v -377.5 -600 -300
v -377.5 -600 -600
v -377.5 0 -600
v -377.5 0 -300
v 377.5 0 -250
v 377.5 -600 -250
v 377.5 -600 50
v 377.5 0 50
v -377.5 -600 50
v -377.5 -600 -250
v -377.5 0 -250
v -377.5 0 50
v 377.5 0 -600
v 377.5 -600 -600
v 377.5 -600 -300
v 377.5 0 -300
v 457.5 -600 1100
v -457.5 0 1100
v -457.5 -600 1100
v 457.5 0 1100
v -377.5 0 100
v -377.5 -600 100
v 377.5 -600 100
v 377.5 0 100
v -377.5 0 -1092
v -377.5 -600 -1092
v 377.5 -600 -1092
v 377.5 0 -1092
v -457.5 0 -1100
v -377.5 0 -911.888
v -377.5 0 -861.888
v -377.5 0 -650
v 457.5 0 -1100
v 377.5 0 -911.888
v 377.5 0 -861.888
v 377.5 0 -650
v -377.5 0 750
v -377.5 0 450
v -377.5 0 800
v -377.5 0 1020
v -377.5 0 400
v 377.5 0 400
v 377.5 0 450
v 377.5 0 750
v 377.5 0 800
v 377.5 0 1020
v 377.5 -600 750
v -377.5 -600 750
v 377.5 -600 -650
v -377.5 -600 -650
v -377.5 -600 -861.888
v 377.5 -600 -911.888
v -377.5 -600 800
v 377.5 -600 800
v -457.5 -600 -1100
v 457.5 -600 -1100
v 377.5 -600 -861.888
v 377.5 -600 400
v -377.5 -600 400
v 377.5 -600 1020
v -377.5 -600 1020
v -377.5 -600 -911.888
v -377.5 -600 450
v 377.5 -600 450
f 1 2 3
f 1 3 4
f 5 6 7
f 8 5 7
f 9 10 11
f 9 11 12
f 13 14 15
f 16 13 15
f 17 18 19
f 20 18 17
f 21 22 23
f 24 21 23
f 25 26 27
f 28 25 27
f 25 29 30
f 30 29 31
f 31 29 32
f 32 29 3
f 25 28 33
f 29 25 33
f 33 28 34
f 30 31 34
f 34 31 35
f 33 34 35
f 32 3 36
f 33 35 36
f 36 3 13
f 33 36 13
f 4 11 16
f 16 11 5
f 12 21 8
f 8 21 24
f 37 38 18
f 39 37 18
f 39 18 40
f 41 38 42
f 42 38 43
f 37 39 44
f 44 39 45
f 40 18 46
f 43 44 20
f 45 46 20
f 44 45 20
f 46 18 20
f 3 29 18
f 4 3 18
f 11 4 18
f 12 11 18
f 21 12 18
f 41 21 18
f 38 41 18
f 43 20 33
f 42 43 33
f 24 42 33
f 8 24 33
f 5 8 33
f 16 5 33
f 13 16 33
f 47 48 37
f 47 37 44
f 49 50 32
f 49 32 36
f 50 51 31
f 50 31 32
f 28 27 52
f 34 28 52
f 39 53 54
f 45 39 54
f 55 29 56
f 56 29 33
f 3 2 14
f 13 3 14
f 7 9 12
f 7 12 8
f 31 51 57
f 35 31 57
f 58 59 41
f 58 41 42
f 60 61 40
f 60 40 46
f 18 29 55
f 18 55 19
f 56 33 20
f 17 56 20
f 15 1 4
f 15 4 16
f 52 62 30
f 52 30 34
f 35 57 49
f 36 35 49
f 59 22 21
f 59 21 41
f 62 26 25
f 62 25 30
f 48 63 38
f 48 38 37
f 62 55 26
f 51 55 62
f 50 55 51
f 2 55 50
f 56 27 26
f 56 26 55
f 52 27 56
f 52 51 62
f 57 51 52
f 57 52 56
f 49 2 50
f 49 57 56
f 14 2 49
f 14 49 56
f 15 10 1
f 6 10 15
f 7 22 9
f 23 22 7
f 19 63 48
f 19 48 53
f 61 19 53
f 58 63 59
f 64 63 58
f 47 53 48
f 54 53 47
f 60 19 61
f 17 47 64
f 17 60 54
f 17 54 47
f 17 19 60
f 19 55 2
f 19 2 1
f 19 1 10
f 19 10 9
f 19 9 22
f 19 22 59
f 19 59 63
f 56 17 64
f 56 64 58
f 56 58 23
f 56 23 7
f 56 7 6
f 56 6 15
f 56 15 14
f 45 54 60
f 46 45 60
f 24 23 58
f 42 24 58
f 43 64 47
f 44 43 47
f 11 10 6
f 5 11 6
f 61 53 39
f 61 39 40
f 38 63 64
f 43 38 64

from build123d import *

# Parameters (mm, degrees)
F0_W     = 915
F0_H     = 2200
F1_DEPTH = 600
F2_W     = 755
F2_H     = 220
F2_H_2   = 300
F2_H_3   = 211.888492
F2_H_4   = 180.111508
F3_DEPTH = 600


with BuildPart() as f1:
    # F0 (on Front) → F1 (new body)
    with BuildSketch(Plane.XZ):
        Rectangle(F0_W, F0_H)
    extrude(amount=F1_DEPTH)

    # F2 (on face) → F3 (cut, through all)
    with BuildSketch(Plane.XZ.offset(600)):
        with Locations((0, 910)):
            Rectangle(F2_W, F2_H)
        with Locations((0, 600)):
            Rectangle(F2_W, F2_H_2)
        with Locations((0, 250)):
            Rectangle(F2_W, F2_H_2)
        with Locations((0, -100)):
            Rectangle(F2_W, F2_H_2)
        with Locations((0, -450)):
            Rectangle(F2_W, F2_H_2)
        with Locations((0, -755.944246)):
            Rectangle(F2_W, F2_H_3)
        with Locations((0, -1001.944246)):
            Rectangle(F2_W, F2_H_4)
    extrude(amount=-F3_DEPTH, mode=Mode.SUBTRACT)


solid = f1.part
